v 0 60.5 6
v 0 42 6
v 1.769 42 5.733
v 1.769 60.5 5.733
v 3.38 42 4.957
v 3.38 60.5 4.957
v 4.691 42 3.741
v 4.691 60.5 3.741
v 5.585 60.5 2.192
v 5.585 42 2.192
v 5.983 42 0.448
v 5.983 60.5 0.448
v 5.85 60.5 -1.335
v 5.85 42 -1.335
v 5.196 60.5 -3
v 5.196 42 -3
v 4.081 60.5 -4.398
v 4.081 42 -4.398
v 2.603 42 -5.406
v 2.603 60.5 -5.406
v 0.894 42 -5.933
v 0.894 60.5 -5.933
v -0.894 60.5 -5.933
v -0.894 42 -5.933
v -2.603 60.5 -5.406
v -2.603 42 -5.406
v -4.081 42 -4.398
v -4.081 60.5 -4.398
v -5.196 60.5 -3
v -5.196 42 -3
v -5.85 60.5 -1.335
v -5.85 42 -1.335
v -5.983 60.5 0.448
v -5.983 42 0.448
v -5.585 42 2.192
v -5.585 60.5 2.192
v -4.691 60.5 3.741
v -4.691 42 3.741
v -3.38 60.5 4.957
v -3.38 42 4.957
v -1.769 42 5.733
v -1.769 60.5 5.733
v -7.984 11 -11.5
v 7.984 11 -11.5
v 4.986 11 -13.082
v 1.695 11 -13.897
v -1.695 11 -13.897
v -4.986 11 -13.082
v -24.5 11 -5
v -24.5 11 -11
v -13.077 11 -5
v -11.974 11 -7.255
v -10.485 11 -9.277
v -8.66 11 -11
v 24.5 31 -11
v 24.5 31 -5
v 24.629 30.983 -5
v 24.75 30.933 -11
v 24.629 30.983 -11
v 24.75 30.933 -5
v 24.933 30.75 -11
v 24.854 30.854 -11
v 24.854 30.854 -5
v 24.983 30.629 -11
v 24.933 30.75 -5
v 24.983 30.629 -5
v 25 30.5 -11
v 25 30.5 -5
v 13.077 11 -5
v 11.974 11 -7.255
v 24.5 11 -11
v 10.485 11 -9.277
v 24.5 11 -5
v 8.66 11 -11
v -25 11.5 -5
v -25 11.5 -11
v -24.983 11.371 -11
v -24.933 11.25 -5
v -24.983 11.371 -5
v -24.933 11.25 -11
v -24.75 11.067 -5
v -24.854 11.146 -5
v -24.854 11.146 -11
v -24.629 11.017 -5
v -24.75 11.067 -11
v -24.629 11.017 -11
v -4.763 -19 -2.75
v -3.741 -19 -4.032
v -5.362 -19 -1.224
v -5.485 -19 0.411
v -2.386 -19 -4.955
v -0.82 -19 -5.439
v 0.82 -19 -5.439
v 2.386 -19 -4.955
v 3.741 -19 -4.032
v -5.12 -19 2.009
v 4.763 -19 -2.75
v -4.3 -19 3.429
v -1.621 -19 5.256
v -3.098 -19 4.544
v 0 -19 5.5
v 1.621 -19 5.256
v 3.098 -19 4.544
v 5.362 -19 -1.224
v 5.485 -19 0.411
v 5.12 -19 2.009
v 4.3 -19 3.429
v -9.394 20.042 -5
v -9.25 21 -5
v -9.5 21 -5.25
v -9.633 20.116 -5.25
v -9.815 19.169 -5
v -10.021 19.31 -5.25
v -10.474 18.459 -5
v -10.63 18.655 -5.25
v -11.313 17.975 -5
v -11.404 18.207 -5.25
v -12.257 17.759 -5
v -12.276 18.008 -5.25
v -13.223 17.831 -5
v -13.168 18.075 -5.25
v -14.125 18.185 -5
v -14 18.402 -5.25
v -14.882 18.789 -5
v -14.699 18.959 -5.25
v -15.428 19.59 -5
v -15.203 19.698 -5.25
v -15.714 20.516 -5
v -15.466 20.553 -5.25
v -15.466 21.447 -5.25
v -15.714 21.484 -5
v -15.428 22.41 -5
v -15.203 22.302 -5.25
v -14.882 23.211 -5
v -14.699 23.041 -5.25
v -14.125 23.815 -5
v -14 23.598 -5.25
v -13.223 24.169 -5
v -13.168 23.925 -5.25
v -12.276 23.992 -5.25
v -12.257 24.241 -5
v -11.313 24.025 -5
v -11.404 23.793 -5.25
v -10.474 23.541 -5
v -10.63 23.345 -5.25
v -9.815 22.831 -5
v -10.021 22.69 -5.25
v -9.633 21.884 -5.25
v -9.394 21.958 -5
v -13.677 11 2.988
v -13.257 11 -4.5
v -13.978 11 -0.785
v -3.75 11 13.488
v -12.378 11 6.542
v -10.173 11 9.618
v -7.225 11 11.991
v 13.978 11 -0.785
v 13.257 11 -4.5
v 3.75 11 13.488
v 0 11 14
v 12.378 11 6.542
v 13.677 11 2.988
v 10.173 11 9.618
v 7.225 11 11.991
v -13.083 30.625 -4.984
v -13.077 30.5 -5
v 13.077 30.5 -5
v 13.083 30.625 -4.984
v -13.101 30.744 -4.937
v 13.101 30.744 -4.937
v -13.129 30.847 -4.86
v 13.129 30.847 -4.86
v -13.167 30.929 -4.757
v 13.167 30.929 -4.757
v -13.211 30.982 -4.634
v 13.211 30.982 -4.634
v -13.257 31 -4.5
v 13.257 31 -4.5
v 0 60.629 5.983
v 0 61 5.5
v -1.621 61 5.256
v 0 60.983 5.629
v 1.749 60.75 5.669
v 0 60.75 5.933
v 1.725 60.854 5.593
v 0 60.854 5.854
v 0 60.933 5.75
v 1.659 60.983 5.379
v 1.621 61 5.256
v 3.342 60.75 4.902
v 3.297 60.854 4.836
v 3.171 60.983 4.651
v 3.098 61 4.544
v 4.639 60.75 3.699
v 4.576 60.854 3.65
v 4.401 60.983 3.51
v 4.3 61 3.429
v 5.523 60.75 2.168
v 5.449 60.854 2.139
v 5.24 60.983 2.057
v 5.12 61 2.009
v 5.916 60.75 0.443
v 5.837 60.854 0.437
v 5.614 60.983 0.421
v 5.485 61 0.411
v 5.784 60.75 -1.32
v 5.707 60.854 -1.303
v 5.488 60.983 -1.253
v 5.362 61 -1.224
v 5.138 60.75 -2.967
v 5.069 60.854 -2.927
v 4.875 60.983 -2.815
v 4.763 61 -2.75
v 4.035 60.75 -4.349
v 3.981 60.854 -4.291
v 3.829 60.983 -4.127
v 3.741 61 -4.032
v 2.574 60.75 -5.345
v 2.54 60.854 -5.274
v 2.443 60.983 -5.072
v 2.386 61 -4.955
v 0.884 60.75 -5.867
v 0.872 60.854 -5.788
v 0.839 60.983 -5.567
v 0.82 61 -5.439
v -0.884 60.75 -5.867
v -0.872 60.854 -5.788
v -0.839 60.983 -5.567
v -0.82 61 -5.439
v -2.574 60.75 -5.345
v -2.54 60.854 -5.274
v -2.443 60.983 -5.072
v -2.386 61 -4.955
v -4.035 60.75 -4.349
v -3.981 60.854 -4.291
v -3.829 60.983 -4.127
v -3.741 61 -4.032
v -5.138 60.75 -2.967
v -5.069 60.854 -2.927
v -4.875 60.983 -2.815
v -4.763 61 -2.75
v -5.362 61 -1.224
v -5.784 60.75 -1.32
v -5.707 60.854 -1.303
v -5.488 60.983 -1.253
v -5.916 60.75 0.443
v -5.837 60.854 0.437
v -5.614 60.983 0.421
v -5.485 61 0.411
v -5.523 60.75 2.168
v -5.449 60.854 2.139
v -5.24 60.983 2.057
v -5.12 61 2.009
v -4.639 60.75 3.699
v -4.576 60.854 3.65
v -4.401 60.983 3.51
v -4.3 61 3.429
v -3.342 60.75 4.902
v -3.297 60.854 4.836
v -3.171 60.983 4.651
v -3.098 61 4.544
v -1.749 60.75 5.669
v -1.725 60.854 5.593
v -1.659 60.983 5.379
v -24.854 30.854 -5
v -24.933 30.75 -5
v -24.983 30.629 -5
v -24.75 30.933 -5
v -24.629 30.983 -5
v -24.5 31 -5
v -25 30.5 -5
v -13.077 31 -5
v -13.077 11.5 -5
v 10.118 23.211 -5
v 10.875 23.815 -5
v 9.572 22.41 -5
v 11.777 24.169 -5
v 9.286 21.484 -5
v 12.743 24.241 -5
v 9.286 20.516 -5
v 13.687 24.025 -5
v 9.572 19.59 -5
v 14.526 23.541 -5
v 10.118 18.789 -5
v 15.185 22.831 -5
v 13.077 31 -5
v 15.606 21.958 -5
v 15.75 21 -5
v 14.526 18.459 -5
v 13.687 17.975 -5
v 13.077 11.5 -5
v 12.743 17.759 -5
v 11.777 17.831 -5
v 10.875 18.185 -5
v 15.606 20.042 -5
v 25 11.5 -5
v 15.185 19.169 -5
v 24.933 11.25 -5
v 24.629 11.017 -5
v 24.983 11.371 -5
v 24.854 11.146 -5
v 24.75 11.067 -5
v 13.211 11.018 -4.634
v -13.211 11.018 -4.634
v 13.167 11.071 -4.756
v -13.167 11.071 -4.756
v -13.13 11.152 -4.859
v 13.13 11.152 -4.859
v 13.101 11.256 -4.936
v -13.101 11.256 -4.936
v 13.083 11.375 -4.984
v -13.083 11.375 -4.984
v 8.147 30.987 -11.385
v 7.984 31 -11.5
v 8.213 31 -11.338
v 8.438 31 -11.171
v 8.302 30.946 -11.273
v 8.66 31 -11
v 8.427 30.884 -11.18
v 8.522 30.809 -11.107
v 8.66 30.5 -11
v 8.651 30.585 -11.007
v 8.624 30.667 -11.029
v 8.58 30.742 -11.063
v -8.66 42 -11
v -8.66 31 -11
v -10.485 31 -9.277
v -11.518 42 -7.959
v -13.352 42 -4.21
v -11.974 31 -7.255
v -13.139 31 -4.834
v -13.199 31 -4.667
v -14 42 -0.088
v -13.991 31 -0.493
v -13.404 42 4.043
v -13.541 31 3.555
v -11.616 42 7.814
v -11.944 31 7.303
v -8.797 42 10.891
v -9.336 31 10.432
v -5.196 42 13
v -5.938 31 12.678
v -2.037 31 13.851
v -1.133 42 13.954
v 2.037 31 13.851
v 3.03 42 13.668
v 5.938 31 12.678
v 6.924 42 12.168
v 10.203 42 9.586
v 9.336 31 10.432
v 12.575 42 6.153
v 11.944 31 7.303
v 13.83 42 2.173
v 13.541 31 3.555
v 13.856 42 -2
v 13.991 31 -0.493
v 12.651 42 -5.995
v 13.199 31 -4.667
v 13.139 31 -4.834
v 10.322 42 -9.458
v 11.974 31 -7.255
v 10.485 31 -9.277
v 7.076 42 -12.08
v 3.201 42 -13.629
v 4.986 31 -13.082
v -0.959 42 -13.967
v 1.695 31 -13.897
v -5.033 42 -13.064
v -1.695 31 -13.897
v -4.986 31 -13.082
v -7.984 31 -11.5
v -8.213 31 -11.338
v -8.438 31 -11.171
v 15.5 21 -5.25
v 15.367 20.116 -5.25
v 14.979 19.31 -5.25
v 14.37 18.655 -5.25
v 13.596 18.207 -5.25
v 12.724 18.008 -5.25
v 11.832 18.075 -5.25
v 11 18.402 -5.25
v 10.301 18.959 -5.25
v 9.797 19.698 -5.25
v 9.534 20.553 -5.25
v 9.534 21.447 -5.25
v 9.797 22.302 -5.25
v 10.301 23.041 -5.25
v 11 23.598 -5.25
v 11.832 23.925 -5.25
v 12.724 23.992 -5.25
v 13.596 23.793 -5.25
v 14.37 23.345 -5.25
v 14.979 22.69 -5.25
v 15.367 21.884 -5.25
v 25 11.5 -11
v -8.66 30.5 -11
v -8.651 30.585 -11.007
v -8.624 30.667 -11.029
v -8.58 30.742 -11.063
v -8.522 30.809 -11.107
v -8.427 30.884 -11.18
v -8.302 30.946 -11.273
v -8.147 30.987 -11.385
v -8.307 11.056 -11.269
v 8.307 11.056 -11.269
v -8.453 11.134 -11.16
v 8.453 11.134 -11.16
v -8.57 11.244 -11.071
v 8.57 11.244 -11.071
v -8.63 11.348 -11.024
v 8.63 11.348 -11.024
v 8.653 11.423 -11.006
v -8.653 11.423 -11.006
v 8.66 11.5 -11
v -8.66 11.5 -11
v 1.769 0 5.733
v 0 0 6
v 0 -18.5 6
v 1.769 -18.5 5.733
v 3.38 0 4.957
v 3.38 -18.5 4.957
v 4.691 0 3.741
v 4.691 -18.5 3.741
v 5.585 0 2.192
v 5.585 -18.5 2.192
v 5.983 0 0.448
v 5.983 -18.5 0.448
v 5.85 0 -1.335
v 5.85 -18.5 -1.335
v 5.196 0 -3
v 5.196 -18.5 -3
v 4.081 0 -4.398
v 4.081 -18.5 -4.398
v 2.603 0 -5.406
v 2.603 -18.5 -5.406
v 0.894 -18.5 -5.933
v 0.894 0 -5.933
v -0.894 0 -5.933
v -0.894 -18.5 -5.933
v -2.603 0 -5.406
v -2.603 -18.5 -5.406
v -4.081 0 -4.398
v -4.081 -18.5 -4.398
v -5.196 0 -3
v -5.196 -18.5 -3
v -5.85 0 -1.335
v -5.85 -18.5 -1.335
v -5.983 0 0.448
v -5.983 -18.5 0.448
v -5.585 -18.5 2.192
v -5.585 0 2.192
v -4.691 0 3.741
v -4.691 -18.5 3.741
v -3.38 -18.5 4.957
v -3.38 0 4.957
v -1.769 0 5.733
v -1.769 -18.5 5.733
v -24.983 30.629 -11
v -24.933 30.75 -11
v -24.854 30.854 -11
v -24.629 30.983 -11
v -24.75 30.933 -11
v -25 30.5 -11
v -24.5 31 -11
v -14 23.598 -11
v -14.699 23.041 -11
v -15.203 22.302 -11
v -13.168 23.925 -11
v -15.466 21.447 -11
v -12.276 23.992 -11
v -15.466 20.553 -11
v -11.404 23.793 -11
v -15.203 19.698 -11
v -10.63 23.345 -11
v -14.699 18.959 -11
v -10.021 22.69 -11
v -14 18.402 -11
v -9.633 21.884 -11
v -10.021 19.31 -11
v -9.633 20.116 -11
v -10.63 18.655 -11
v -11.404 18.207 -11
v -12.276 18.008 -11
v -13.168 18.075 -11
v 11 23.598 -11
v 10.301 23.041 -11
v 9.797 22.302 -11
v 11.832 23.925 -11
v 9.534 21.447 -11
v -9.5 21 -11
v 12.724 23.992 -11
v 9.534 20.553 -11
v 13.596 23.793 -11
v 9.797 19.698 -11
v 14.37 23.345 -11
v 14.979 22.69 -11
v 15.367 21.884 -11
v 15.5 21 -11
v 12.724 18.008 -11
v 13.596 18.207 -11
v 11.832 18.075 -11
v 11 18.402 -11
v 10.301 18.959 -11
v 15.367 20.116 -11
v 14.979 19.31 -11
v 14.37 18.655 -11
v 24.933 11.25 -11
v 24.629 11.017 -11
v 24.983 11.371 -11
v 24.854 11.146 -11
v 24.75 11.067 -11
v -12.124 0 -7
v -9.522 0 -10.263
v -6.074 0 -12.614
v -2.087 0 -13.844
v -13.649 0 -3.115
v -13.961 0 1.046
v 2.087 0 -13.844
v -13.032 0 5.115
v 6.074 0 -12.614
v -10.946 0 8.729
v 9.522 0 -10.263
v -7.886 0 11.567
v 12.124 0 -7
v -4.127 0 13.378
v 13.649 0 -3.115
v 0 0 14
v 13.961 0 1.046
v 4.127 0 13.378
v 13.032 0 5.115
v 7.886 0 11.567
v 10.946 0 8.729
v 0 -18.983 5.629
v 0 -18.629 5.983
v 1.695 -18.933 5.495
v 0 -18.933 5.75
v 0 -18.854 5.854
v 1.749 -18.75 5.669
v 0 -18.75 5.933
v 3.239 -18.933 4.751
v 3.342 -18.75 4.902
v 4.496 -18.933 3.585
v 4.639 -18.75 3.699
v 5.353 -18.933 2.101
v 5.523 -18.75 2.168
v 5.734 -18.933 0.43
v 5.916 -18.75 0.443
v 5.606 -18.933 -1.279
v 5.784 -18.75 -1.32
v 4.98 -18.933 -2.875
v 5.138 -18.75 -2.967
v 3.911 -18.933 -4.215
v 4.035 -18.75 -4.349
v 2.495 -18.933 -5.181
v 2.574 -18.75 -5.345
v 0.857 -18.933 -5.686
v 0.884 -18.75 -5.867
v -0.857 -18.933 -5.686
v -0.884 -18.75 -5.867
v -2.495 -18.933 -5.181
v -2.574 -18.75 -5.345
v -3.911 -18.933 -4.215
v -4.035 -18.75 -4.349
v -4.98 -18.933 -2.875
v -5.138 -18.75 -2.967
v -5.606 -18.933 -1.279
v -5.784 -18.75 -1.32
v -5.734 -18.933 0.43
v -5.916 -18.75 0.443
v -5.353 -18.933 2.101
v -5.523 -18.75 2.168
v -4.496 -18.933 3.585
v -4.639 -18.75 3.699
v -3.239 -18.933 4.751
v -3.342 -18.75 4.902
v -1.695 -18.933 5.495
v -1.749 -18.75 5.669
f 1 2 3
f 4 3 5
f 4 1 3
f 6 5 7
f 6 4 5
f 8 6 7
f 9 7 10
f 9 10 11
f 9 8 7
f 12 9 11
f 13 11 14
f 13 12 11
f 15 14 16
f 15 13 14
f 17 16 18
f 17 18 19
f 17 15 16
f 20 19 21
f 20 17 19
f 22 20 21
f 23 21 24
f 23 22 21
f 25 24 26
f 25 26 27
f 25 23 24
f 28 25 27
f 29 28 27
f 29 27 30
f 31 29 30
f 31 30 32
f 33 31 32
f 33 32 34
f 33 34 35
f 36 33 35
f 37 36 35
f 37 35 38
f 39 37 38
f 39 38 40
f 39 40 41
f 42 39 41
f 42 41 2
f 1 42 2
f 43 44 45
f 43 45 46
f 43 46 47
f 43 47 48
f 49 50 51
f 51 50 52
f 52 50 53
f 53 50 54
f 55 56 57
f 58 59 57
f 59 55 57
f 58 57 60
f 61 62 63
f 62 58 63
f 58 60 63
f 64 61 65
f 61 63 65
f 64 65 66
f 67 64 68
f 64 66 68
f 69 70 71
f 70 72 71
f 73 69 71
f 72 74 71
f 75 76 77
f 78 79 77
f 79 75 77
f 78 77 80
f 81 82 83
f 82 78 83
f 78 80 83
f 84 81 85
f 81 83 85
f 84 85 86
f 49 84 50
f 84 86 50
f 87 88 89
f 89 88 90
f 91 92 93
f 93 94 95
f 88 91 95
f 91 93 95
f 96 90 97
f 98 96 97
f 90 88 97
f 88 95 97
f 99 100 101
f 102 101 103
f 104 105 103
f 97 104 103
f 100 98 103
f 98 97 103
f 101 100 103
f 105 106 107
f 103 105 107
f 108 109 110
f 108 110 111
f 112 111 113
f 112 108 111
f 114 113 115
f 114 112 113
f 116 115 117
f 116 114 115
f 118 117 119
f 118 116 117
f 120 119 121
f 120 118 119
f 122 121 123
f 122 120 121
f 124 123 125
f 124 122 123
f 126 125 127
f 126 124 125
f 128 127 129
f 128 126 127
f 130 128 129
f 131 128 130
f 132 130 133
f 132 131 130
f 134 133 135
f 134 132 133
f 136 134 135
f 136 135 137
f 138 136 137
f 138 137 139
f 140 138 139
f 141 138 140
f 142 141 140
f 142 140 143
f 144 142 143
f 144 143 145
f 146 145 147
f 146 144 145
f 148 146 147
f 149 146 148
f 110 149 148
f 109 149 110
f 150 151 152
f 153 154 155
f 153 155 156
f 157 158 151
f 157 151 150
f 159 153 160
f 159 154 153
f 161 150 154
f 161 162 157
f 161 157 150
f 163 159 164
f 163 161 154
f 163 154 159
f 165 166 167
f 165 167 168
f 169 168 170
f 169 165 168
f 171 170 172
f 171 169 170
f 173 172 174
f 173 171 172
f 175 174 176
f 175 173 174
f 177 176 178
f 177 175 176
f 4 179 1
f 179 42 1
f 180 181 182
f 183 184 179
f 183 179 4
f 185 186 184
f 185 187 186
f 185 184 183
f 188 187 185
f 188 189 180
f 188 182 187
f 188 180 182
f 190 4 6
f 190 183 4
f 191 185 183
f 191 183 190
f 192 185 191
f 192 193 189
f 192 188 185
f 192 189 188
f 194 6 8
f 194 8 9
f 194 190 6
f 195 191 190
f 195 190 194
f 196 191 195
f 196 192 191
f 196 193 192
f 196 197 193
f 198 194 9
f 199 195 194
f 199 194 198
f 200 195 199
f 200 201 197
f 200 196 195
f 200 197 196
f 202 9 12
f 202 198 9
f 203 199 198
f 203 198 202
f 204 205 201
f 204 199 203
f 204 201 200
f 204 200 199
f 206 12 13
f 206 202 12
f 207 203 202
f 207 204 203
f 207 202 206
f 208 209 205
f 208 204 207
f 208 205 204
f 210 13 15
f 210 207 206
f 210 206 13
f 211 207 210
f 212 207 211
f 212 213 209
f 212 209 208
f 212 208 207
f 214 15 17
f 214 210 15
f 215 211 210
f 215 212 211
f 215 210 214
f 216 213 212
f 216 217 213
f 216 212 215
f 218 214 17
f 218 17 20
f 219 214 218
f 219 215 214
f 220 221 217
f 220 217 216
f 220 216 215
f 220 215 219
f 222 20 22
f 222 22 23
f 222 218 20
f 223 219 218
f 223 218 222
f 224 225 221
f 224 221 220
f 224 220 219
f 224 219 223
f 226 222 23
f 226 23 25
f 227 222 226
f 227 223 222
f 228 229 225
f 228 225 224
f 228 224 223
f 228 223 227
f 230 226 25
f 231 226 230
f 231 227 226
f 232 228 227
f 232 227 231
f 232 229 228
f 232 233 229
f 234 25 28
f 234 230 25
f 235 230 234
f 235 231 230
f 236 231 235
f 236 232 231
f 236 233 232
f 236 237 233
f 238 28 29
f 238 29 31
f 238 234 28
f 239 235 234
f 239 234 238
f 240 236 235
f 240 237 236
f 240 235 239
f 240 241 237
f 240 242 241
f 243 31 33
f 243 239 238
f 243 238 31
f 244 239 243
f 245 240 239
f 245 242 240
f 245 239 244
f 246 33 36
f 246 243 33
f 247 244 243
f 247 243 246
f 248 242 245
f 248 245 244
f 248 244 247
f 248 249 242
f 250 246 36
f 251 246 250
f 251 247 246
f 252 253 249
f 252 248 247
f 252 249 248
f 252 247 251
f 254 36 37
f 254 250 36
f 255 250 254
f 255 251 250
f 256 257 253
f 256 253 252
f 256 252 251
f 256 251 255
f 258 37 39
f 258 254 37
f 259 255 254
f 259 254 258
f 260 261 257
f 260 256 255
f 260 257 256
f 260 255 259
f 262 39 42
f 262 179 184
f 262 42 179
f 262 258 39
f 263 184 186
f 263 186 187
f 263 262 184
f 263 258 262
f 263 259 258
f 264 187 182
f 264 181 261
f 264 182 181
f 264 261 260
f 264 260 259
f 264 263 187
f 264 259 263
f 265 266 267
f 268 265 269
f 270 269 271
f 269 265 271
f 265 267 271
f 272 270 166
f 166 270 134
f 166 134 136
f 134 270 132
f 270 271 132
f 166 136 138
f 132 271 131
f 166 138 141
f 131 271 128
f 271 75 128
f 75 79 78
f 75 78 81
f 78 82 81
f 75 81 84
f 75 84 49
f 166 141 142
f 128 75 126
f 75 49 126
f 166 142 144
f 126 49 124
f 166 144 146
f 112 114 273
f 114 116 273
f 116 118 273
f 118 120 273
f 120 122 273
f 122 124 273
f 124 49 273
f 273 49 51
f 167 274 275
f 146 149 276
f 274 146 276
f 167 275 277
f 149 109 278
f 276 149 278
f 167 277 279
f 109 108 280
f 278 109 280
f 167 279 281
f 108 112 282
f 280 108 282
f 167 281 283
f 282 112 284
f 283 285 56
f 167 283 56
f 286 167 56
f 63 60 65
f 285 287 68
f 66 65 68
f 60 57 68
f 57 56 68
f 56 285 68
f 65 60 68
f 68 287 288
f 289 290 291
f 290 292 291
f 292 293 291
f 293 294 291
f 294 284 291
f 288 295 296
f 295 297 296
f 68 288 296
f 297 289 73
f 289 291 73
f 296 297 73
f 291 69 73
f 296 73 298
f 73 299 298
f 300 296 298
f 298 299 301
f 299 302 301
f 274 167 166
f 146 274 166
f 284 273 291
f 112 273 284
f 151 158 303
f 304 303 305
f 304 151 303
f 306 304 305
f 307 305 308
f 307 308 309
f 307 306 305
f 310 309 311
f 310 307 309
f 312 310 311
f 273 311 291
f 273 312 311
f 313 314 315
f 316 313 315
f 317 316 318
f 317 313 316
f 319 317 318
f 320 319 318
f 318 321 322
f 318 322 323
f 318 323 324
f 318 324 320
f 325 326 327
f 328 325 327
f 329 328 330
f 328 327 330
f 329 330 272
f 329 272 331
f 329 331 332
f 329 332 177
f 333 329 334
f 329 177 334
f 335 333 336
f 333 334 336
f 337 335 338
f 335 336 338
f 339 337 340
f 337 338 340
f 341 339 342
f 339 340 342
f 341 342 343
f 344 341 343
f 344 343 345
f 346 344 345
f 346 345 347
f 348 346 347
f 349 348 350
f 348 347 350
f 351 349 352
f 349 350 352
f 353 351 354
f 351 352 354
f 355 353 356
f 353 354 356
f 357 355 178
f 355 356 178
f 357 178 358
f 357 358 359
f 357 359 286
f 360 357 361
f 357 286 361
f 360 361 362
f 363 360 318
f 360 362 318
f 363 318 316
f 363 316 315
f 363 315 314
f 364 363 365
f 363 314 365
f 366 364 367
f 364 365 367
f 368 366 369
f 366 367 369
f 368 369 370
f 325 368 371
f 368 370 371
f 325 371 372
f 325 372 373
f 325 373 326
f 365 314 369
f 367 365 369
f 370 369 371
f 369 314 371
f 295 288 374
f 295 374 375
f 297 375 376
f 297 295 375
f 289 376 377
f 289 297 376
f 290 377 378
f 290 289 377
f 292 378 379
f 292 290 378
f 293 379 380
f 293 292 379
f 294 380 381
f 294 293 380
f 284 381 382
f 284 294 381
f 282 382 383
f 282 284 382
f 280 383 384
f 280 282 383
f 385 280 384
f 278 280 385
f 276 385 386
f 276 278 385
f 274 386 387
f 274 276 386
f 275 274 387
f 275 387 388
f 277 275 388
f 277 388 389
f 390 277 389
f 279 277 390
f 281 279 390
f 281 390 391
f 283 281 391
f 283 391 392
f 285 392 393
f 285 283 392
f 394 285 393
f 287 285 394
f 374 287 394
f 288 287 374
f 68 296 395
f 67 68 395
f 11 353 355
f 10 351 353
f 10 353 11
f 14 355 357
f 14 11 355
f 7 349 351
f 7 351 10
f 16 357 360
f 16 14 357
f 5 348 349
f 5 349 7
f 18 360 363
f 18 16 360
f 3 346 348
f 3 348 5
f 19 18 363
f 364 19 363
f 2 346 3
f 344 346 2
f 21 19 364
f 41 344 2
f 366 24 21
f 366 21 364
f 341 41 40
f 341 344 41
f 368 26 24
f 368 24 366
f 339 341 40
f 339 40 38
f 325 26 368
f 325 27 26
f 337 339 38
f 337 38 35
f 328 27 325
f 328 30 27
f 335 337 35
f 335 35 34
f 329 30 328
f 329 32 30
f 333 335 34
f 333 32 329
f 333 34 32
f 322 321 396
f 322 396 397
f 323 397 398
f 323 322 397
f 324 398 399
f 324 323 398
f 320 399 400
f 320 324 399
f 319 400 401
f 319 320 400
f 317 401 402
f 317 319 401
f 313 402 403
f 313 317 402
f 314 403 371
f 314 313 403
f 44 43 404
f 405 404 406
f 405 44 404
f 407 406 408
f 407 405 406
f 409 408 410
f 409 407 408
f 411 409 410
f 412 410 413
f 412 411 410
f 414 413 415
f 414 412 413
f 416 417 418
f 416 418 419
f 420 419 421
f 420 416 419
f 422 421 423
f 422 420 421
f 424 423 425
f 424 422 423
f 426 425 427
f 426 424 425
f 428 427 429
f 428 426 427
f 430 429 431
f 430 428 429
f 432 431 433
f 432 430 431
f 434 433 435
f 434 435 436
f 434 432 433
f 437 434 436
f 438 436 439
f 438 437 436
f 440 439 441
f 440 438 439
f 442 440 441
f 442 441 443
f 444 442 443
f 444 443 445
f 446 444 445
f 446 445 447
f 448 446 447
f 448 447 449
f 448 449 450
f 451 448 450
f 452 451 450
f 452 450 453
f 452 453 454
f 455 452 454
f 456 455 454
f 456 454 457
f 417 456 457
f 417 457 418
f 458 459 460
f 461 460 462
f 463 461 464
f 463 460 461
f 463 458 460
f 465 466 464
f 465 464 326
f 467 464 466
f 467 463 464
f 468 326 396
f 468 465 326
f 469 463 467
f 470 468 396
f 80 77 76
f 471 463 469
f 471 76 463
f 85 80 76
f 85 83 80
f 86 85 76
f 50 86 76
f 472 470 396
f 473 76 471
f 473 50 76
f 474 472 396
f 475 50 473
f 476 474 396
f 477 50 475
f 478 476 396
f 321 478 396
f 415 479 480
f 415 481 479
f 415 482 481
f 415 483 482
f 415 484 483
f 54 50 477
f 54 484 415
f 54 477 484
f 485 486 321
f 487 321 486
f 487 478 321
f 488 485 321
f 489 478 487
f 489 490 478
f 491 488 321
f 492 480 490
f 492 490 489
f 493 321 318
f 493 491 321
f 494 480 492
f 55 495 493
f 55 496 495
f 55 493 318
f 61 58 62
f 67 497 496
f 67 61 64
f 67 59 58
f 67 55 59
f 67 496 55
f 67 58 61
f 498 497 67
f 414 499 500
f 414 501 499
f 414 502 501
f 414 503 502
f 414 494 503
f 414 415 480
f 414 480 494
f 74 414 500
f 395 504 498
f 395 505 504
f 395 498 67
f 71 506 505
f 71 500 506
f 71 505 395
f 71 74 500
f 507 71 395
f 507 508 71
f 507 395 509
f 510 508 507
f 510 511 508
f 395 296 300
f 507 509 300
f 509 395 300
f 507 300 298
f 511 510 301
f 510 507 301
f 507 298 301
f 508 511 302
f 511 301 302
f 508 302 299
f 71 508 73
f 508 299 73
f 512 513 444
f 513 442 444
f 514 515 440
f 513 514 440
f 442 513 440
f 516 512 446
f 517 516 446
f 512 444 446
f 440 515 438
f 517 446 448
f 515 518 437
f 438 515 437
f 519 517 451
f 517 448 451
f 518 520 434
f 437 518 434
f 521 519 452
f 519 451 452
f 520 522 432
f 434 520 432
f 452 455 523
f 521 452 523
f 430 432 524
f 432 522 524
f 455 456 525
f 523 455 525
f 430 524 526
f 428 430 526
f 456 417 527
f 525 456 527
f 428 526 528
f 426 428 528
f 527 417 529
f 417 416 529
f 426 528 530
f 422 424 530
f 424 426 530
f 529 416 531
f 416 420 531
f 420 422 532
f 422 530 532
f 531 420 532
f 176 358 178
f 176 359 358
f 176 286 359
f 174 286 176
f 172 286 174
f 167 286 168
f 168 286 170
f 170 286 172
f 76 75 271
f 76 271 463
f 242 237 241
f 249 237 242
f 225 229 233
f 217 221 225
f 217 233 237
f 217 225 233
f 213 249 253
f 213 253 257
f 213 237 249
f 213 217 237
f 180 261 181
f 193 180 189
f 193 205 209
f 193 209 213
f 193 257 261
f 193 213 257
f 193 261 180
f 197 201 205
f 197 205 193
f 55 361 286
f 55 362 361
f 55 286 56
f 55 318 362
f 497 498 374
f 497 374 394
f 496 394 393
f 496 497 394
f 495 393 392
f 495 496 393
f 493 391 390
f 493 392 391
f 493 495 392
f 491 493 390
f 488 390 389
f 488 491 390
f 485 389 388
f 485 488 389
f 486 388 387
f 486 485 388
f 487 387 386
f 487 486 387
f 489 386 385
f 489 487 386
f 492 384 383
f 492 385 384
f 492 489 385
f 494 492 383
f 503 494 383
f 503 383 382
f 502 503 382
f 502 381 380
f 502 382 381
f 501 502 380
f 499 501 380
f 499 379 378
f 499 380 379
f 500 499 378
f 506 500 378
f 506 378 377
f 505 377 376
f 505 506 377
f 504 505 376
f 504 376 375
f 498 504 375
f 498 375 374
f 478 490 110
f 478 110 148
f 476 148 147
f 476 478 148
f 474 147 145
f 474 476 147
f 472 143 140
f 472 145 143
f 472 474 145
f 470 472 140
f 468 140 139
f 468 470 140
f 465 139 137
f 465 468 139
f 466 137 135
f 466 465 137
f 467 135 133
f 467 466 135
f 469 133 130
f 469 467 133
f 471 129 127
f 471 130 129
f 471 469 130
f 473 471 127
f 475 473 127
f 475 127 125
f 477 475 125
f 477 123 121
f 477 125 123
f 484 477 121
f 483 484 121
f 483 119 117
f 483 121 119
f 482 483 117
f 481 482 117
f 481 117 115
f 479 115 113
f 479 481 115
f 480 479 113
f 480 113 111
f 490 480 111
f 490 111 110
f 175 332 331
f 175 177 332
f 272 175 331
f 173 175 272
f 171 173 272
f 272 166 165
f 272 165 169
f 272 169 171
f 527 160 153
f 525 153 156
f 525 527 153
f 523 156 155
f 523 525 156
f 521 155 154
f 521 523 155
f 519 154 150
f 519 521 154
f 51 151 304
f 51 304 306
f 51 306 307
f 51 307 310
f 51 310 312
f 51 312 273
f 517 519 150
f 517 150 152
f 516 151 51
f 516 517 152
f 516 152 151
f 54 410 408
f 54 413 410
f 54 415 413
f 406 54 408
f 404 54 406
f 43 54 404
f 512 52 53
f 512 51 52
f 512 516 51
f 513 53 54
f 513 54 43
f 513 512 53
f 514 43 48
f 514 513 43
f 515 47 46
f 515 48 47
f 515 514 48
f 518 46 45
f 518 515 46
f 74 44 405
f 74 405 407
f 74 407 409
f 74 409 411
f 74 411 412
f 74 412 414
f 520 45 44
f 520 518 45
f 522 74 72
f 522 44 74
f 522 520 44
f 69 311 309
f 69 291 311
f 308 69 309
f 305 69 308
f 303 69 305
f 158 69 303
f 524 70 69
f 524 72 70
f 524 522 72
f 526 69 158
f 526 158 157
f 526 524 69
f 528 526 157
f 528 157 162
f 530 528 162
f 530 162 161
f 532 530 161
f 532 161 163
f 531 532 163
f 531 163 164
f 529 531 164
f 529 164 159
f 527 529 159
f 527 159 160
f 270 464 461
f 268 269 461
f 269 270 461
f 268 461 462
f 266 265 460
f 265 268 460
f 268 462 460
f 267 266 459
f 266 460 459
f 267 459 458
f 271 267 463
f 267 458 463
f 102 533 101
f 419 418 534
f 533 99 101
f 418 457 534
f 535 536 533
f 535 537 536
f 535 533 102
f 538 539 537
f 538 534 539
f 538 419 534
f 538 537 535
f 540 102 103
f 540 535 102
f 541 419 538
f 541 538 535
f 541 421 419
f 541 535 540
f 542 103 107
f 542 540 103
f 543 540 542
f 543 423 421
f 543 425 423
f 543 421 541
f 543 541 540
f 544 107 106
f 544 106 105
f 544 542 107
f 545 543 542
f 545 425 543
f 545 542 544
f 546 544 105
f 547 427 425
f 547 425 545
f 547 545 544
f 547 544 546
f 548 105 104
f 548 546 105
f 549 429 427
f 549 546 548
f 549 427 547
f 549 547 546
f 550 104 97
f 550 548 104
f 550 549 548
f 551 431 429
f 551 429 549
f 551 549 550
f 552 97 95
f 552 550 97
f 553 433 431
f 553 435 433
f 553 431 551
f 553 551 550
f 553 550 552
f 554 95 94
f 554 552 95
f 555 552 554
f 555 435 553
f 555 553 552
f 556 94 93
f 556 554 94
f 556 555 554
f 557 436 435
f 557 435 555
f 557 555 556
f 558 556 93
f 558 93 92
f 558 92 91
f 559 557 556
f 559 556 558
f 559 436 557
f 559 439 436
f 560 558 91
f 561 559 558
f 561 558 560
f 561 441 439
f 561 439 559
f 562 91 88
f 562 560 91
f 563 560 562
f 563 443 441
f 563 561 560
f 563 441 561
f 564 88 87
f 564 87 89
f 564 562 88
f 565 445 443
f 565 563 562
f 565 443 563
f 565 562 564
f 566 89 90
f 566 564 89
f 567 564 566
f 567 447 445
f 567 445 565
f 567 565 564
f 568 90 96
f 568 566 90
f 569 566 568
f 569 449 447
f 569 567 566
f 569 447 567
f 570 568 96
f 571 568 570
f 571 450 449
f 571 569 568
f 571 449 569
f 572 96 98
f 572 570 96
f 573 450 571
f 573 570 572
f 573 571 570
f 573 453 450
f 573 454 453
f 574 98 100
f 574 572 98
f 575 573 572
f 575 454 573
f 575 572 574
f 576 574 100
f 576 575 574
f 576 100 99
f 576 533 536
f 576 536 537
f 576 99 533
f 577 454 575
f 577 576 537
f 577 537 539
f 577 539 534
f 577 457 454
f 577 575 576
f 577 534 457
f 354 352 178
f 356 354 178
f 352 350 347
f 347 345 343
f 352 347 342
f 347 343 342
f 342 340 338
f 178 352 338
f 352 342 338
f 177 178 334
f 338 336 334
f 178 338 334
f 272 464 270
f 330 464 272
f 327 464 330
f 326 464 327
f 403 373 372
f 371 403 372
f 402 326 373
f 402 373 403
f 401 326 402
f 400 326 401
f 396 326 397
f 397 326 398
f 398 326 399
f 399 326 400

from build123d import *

# Parameters (mm, degrees)
CROQUIS1_R                 = 6
SALIENTE_EXTRUIR1_DEPTH    = 19
CROQUIS2_R                 = 14
SALIENTE_EXTRUIR2_DEPTH    = 11
CROQUIS5_W                 = 50
CROQUIS5_H                 = 6
SALIENTE_EXTRUIR6_DEPTH    = 20
CROQUIS6_R                 = 14
SALIENTE_EXTRUIR7_DEPTH    = 11
SALIENTE_EXTRUIR8_START    = 19
CROQUIS7_R                 = 6
SALIENTE_EXTRUIR8_DEPTH    = 19
CORTAR_EXTRUIR2_DEPTH      = 69.607579756
CORTAR_EXTRUIR2_DEPTH_BACK = 69.607579756
CROQUIS9_R                 = 3
REDONDEO2_R                = 0.5
CHAFL_N1_SIZE              = 0.25


with BuildPart() as part:
    # Croquis1 → Saliente-Extruir1 (new body)
    with BuildSketch(Plane(origin=(0, 0, 0), x_dir=(1, 0, 0), z_dir=(0, 1, 0))):
        with Locations(Location((0, 0, 0), (0, 0, 270))):
            Circle(CROQUIS1_R)
    extrude(amount=-SALIENTE_EXTRUIR1_DEPTH)

    # Croquis2 → Saliente-Extruir2 (add)
    with BuildSketch(Plane(origin=(0, 0, 0), x_dir=(1, 0, 0), z_dir=(0, 1, 0))):
        with Locations(Location((0, 0, 0), (0, 0, 270))):
            Circle(CROQUIS2_R)
    extrude(amount=SALIENTE_EXTRUIR2_DEPTH)

    # Croquis5 → Saliente-Extruir6 (add)
    with BuildSketch(Plane(origin=(0, 11, 0), x_dir=(1, 0, 0), z_dir=(0, 1, 0))):
        with Locations((0, 8)):
            Rectangle(CROQUIS5_W, CROQUIS5_H)
    extrude(amount=SALIENTE_EXTRUIR6_DEPTH)

    # Croquis6 → Saliente-Extruir7 (add)
    with BuildSketch(Plane(origin=(0, 31, 0), x_dir=(1, 0, 0), z_dir=(0, 1, 0))):
        with Locations(Location((0, 0, 0), (0, 0, 128.213210702))):
            Circle(CROQUIS6_R)
    extrude(amount=SALIENTE_EXTRUIR7_DEPTH)

    # Croquis7 → Saliente-Extruir8 (add)
    with BuildSketch(Plane(origin=(0, 42, 0), x_dir=(1, 0, 0), z_dir=(0, 1, 0)).offset(SALIENTE_EXTRUIR8_START)):
        with Locations(Location((0, 0, 0), (0, 0, 270))):
            Circle(CROQUIS7_R)
    extrude(amount=-SALIENTE_EXTRUIR8_DEPTH)

    # Croquis9 → Cortar-Extruir2 (cut, two sides: drawn at the far end of the back side and taken through both)
    with BuildSketch(Plane.XY.offset(-5).offset(-CORTAR_EXTRUIR2_DEPTH_BACK)):
        with Locations((-12.5, 21)):
            Circle(CROQUIS9_R)
        with Locations((12.5, 21)):
            Circle(CROQUIS9_R)
    extrude(amount=CORTAR_EXTRUIR2_DEPTH + CORTAR_EXTRUIR2_DEPTH_BACK, mode=Mode.SUBTRACT)

    # Redondeo2
    # the kernel refuses this fillet: 0.5 mm, written as the material it adds along each edge
    with BuildSketch(Plane(origin=(9.910254038, 11, -11), x_dir=(0, 0, -1), z_dir=(-1, 0, 0))) as redondeo2_piece_1_section:
        with BuildLine():
            CenterArc((REDONDEO2_R, -REDONDEO2_R), REDONDEO2_R, 90, 90)
            Line((0, -REDONDEO2_R), (0, 0))
            Line((0, 0), (REDONDEO2_R, 0))
        make_face()
    redondeo2_piece_1 = extrude(amount=19.820508076, mode=Mode.PRIVATE)
    redondeo2_piece_1 = redondeo2_piece_1 & Plane(origin=(0, 11.11248229, 0), x_dir=(0, 0, 1), z_dir=(0, -1, 0)) * Cylinder(14, 42, mode=Mode.PRIVATE)
    add(redondeo2_piece_1)
    with BuildSketch(Plane(origin=(-14.326696831, 11, -5), x_dir=(0, 0, 1), z_dir=(1, 0, 0))) as redondeo2_piece_2_section:
        with BuildLine():
            CenterArc((REDONDEO2_R, -REDONDEO2_R), REDONDEO2_R, 90, 90)
            Line((0, -REDONDEO2_R), (0, 0))
            Line((0, 0), (REDONDEO2_R, 0))
        make_face()
    redondeo2_piece_2 = extrude(amount=28.653393661, mode=Mode.PRIVATE)
    redondeo2_piece_2 = redondeo2_piece_2 & Plane(origin=(0, 11.111538065, 0), x_dir=(0, 0, 1), z_dir=(0, -1, 0)) * Cylinder(14, 60, mode=Mode.PRIVATE)
    add(redondeo2_piece_2)
    with BuildSketch(Plane(origin=(-14.326696831, 31, -5), x_dir=(0, -1, 0), z_dir=(1, 0, 0))) as redondeo2_piece_3_section:
        with BuildLine():
            CenterArc((REDONDEO2_R, -REDONDEO2_R), REDONDEO2_R, 90, 90)
            Line((0, -REDONDEO2_R), (0, 0))
            Line((0, 0), (REDONDEO2_R, 0))
        make_face()
    redondeo2_piece_3 = extrude(amount=28.653393661, mode=Mode.PRIVATE)
    redondeo2_piece_3 = redondeo2_piece_3 & Plane(origin=(0, 30.888461941, 0), x_dir=(-0.6185895741353322, 0, -0.7857142857114591), z_dir=(0, -1, 0)) * Cylinder(14, 60, mode=Mode.PRIVATE)
    add(redondeo2_piece_3)
    with BuildSketch(Plane(origin=(9.910254038, 31, -11), x_dir=(0, -1, 0), z_dir=(-1, 0, 0))) as redondeo2_piece_4_section:
        with BuildLine():
            CenterArc((REDONDEO2_R, -REDONDEO2_R), REDONDEO2_R, 90, 90)
            Line((0, -REDONDEO2_R), (0, 0))
            Line((0, 0), (REDONDEO2_R, 0))
        make_face()
    redondeo2_piece_4 = extrude(amount=19.820508076, mode=Mode.PRIVATE)
    redondeo2_piece_4 = redondeo2_piece_4 & Plane(origin=(0, 30.887517705, 0), x_dir=(-0.6185895741353322, 0, -0.7857142857114591), z_dir=(0, -1, 0)) * Cylinder(14, 42, mode=Mode.PRIVATE)
    add(redondeo2_piece_4)
    # the kernel refuses this fillet: 0.5 mm, written as the material it takes off along each edge
    with BuildSketch(Plane(origin=(0, -19, 0), x_dir=(0, 0, 1), z_dir=(-1, 0, 0))) as redondeo2_2_piece_1:
        with BuildLine():
            CenterArc((6 - REDONDEO2_R, REDONDEO2_R), REDONDEO2_R, 270, 90)
            Line((6 - REDONDEO2_R, 0), (6, 0))
            Line((6, 0), (6, REDONDEO2_R))
        make_face()
    revolve(axis=Axis((0, -19, 0), (0, 1, 0)), mode=Mode.SUBTRACT)
    with BuildSketch(Plane(origin=(0, 61, 0), x_dir=(0, 0, 1), z_dir=(-1, 0, 0))) as redondeo2_2_piece_2:
        with BuildLine():
            CenterArc((6 - REDONDEO2_R, -REDONDEO2_R), REDONDEO2_R, 0, 90)
            Line((6 - REDONDEO2_R, 0), (6, 0))
            Line((6, 0), (6, -REDONDEO2_R))
        make_face()
    revolve(axis=Axis((0, 61, 0), (0, 1, 0)), mode=Mode.SUBTRACT)
    with BuildSketch(Plane(origin=(25, 11, -3.75), x_dir=(-1, 0, 0), z_dir=(0, 0, -1)), Plane(origin=(25, 31, -3.75), x_dir=(0, -1, 0), z_dir=(0, 0, -1)), Plane(origin=(-25, 11, -12.25), x_dir=(1, 0, 0), z_dir=(0, 0, 1)), Plane(origin=(-25, 31, -12.25), x_dir=(0, -1, 0), z_dir=(0, 0, 1))) as redondeo2_2_piece_3:
        with BuildLine():
            CenterArc((REDONDEO2_R, REDONDEO2_R), REDONDEO2_R, 180, 90)
            Line((0, REDONDEO2_R), (0, 0))
            Line((0, 0), (REDONDEO2_R, 0))
        make_face()
    extrude(amount=8.5, mode=Mode.SUBTRACT)

    # Chaflán1
    chafl_n1_edges = [part.edges().sort_by_distance(p)[0] for p in [
        (-15.5, 21, -5),
        (9.5, 21, -5),
    ]]
    chamfer(chafl_n1_edges, length=CHAFL_N1_SIZE)


solid = part.part
